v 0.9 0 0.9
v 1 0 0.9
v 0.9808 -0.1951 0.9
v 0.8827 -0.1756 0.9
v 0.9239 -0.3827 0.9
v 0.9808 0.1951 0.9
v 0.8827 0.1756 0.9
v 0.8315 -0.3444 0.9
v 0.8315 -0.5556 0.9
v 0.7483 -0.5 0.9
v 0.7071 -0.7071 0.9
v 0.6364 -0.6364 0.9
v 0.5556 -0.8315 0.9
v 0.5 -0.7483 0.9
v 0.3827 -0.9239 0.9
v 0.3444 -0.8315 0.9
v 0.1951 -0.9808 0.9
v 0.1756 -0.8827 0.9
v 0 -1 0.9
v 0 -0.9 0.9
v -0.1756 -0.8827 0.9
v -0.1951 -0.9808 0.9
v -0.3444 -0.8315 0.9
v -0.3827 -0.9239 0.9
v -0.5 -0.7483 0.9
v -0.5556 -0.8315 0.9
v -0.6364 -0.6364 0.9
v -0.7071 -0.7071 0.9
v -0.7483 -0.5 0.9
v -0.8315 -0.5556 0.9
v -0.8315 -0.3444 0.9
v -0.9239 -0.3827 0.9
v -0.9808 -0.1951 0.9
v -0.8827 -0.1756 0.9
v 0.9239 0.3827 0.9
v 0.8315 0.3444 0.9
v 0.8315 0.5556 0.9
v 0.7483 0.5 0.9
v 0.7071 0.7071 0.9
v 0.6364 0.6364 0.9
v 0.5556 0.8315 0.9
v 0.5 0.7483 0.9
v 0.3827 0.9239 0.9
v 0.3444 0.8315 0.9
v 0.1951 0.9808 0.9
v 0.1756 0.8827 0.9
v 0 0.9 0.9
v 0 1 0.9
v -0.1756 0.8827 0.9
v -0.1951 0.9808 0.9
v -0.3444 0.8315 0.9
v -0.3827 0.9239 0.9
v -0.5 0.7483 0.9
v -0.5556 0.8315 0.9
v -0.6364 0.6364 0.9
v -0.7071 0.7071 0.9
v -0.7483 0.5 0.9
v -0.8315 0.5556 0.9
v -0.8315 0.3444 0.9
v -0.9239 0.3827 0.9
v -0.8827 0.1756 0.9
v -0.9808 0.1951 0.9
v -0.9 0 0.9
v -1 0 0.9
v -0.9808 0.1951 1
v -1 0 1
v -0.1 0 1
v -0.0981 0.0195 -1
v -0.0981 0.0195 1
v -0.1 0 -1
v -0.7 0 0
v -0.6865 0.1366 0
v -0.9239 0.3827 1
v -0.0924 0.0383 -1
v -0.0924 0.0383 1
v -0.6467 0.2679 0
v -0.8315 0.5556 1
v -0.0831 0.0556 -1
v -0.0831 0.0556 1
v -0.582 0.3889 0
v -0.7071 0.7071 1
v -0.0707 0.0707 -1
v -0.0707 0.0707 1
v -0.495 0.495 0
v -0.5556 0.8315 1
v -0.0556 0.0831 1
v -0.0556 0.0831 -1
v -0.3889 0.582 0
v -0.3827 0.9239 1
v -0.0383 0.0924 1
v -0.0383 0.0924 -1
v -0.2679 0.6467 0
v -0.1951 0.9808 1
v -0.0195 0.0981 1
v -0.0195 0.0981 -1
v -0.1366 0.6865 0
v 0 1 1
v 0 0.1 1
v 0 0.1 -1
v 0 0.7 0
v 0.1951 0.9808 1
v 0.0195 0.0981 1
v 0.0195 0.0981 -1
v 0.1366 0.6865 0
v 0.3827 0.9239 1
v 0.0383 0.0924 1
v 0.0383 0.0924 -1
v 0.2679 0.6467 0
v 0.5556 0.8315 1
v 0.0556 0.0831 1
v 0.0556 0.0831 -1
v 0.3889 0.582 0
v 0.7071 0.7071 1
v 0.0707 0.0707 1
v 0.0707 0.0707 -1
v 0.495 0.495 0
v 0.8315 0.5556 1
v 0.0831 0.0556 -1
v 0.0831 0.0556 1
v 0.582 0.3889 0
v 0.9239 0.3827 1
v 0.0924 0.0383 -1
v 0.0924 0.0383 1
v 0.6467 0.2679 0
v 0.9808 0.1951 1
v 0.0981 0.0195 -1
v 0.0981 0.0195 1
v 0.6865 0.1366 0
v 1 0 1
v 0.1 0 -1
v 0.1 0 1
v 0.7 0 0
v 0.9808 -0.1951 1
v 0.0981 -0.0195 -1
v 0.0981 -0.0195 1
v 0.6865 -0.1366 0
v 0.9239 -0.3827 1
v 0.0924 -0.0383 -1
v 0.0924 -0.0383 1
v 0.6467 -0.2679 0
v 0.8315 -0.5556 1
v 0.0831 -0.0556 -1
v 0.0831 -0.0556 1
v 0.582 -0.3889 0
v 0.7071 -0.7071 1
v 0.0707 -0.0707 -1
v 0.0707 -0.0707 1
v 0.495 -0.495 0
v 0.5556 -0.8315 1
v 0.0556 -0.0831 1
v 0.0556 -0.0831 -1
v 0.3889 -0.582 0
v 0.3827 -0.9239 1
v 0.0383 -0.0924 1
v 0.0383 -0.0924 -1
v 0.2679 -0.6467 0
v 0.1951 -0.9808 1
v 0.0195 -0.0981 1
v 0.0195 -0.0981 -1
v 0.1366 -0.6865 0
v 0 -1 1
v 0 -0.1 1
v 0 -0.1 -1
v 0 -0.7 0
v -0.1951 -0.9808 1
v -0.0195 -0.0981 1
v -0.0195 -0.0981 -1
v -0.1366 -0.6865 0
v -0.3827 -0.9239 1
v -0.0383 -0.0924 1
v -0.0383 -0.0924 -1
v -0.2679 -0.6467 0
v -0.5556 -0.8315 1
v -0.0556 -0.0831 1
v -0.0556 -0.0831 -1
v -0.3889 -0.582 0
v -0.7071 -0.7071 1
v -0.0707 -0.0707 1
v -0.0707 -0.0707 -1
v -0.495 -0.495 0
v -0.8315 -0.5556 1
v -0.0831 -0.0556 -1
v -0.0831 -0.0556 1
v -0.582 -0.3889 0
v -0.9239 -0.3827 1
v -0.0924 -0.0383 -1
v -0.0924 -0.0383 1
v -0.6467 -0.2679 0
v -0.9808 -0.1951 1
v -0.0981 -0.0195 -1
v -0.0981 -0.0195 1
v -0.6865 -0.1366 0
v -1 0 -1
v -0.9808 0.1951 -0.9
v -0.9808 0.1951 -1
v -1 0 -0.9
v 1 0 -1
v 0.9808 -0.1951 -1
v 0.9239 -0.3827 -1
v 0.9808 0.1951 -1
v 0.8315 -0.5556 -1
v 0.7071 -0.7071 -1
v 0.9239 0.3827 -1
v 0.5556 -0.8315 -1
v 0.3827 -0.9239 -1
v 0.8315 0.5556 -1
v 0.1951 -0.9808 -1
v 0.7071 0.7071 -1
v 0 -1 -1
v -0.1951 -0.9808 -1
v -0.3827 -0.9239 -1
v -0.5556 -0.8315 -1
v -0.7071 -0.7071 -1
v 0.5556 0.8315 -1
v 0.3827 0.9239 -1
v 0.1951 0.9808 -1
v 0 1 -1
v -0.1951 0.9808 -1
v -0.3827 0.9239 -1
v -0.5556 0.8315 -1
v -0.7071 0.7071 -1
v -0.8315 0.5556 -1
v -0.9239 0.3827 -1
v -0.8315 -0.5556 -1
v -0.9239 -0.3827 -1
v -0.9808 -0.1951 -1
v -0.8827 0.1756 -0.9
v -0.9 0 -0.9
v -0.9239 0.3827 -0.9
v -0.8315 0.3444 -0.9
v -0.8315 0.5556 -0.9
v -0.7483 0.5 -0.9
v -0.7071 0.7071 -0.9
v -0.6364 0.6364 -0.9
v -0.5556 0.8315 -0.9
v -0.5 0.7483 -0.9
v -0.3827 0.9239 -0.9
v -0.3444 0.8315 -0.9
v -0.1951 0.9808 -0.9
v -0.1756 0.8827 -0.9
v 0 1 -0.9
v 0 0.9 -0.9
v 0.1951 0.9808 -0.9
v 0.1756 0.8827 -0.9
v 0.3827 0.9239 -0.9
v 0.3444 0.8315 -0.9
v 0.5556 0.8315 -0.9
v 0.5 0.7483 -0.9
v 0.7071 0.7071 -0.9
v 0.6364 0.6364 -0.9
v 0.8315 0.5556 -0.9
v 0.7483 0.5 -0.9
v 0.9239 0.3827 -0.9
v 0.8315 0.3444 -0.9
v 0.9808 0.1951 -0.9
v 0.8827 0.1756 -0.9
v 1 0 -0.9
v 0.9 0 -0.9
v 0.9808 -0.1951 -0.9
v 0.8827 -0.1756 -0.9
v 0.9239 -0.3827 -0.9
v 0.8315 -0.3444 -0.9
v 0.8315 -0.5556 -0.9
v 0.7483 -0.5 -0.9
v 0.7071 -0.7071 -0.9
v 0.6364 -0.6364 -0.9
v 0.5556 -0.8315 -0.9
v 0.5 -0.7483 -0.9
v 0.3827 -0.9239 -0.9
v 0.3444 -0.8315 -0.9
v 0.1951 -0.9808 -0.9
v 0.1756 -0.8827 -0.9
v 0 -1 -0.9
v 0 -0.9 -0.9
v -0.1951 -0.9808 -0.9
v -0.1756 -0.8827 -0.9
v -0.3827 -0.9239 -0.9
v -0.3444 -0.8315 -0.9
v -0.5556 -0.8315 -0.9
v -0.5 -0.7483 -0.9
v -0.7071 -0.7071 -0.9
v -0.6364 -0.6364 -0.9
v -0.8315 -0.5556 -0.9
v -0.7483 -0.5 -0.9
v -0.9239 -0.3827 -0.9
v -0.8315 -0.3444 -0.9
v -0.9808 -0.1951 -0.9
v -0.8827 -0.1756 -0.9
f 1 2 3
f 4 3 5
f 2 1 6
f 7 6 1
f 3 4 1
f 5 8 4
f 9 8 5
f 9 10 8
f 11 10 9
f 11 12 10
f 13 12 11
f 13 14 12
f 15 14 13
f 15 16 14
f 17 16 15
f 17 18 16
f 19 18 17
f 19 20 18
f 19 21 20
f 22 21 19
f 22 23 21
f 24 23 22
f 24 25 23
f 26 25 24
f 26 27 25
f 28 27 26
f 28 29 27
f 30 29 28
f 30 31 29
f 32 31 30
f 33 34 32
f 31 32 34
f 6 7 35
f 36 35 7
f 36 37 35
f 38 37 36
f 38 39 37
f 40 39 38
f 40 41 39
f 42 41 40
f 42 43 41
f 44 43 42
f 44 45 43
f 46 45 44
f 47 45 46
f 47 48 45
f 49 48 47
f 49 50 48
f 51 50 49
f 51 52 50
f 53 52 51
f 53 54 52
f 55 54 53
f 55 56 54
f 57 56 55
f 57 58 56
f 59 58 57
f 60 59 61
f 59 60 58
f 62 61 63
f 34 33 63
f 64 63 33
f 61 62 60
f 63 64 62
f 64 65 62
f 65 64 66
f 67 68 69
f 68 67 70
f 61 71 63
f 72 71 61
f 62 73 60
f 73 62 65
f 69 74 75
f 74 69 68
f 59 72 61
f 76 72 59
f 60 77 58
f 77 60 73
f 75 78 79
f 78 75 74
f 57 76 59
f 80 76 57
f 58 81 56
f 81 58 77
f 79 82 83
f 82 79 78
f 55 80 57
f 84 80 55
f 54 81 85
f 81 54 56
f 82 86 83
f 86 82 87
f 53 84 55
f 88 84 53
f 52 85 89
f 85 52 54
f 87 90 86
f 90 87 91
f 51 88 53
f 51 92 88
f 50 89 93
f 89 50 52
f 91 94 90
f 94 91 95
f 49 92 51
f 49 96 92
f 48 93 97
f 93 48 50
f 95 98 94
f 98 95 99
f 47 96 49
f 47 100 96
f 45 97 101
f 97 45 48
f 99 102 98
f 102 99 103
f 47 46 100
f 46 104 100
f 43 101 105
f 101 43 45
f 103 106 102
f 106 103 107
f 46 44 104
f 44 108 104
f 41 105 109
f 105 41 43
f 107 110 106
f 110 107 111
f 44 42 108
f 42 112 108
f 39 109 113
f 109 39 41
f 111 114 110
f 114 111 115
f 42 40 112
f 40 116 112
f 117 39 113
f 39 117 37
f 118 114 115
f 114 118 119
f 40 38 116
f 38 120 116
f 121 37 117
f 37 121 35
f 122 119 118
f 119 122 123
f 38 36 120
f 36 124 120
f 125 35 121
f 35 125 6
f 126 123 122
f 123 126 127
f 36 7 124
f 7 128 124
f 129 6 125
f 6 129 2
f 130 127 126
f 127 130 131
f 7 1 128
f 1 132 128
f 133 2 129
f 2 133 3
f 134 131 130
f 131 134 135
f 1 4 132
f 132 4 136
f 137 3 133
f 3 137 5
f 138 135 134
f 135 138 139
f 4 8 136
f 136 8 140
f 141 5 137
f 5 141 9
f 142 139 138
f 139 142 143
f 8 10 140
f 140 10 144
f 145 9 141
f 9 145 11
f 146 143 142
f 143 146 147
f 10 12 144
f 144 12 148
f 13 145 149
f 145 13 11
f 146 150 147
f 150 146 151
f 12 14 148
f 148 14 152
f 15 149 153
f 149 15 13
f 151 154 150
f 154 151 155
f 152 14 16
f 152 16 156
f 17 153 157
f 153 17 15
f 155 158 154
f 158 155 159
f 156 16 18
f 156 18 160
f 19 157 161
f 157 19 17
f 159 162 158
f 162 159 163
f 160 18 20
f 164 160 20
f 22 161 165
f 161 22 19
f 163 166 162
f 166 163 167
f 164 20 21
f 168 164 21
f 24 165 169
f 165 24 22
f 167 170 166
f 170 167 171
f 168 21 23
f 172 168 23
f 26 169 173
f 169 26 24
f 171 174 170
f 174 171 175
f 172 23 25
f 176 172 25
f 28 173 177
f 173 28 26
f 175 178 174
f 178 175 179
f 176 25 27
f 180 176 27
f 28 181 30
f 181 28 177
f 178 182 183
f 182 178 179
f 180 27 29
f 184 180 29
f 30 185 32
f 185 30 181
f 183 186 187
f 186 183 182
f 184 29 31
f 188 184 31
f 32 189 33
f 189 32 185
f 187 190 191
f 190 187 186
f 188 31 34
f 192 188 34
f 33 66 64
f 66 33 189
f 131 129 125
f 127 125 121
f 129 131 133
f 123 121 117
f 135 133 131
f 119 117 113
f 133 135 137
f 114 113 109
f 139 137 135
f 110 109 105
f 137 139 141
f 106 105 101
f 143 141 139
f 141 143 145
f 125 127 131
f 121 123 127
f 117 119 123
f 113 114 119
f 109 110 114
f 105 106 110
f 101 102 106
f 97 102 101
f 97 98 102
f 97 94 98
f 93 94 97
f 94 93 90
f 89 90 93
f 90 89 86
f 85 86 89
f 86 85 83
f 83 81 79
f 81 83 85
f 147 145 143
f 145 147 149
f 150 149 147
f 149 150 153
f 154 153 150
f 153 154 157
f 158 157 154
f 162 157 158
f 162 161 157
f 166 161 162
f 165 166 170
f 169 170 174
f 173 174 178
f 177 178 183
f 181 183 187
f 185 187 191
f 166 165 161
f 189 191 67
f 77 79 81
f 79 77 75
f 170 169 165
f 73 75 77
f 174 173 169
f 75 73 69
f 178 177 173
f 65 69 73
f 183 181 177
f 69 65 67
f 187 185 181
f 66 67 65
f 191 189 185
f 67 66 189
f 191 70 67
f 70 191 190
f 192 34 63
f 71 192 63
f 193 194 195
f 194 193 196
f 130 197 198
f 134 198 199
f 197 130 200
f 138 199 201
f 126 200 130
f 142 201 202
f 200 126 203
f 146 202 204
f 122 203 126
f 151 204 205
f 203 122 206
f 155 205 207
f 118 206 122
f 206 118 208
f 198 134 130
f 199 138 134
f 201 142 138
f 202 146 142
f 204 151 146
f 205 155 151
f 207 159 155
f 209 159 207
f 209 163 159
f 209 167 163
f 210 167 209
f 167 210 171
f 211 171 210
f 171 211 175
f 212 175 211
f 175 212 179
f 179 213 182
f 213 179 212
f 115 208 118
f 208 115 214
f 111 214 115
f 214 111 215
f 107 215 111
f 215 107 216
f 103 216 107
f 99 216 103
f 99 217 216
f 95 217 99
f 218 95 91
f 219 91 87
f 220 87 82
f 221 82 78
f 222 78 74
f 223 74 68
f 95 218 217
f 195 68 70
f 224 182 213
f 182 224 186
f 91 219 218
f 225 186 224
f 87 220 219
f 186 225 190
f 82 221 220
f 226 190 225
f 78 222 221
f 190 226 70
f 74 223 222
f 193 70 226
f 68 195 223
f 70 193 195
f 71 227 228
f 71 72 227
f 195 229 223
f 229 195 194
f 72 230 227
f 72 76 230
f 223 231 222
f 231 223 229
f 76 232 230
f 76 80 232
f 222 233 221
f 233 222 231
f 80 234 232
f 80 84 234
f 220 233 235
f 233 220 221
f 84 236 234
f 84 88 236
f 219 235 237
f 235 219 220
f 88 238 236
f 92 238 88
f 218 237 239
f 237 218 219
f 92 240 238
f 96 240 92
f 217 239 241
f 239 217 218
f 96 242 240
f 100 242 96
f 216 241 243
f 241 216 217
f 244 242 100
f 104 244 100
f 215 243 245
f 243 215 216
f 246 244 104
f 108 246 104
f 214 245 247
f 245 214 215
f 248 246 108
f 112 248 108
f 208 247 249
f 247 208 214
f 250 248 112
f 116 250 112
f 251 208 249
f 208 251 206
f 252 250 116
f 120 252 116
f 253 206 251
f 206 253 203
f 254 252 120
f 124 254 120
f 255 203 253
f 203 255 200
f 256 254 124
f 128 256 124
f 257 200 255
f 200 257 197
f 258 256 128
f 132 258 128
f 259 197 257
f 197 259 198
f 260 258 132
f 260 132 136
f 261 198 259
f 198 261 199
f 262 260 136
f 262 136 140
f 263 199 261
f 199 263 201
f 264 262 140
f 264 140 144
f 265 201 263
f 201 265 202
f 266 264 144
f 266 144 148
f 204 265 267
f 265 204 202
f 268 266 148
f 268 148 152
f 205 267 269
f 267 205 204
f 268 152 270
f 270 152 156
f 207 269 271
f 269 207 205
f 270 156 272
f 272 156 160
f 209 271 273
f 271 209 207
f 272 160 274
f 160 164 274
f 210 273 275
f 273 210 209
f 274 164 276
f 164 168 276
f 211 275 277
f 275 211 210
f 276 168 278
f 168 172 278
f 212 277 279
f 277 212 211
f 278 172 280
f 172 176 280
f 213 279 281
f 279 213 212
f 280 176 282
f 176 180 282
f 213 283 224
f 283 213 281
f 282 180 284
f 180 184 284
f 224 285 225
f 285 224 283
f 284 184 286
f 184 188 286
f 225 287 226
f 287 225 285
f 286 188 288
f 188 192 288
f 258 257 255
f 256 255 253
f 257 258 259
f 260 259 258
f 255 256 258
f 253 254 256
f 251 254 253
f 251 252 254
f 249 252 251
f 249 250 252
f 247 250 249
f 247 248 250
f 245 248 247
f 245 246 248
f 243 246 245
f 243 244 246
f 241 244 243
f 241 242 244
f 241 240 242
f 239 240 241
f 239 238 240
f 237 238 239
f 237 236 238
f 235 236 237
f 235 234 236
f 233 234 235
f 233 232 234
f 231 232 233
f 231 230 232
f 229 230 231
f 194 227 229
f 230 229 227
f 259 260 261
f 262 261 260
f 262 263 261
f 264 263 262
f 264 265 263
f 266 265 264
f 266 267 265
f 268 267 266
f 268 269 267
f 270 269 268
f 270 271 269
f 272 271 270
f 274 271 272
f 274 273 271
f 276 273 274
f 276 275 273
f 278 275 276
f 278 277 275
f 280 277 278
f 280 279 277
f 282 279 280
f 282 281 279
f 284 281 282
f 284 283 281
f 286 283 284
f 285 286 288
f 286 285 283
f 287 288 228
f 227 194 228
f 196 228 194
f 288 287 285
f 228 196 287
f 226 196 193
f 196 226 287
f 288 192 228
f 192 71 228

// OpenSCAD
height = 2;
width = 1;

brim = .1;
edge = .1;
depth = .2;

hole = .2;

module half_spool() {
    rotate_extrude($fn=32)
    polygon([
        [hole/2, height/2],
        [width, height/2],
        [width, height/2 - edge],
        [width - brim, height/2 - edge],
        [width - brim - depth, 0],
        [hole/2, 0]
    ]);
}

union() {
    half_spool();
    mirror([0,0,1]) half_spool();
}
